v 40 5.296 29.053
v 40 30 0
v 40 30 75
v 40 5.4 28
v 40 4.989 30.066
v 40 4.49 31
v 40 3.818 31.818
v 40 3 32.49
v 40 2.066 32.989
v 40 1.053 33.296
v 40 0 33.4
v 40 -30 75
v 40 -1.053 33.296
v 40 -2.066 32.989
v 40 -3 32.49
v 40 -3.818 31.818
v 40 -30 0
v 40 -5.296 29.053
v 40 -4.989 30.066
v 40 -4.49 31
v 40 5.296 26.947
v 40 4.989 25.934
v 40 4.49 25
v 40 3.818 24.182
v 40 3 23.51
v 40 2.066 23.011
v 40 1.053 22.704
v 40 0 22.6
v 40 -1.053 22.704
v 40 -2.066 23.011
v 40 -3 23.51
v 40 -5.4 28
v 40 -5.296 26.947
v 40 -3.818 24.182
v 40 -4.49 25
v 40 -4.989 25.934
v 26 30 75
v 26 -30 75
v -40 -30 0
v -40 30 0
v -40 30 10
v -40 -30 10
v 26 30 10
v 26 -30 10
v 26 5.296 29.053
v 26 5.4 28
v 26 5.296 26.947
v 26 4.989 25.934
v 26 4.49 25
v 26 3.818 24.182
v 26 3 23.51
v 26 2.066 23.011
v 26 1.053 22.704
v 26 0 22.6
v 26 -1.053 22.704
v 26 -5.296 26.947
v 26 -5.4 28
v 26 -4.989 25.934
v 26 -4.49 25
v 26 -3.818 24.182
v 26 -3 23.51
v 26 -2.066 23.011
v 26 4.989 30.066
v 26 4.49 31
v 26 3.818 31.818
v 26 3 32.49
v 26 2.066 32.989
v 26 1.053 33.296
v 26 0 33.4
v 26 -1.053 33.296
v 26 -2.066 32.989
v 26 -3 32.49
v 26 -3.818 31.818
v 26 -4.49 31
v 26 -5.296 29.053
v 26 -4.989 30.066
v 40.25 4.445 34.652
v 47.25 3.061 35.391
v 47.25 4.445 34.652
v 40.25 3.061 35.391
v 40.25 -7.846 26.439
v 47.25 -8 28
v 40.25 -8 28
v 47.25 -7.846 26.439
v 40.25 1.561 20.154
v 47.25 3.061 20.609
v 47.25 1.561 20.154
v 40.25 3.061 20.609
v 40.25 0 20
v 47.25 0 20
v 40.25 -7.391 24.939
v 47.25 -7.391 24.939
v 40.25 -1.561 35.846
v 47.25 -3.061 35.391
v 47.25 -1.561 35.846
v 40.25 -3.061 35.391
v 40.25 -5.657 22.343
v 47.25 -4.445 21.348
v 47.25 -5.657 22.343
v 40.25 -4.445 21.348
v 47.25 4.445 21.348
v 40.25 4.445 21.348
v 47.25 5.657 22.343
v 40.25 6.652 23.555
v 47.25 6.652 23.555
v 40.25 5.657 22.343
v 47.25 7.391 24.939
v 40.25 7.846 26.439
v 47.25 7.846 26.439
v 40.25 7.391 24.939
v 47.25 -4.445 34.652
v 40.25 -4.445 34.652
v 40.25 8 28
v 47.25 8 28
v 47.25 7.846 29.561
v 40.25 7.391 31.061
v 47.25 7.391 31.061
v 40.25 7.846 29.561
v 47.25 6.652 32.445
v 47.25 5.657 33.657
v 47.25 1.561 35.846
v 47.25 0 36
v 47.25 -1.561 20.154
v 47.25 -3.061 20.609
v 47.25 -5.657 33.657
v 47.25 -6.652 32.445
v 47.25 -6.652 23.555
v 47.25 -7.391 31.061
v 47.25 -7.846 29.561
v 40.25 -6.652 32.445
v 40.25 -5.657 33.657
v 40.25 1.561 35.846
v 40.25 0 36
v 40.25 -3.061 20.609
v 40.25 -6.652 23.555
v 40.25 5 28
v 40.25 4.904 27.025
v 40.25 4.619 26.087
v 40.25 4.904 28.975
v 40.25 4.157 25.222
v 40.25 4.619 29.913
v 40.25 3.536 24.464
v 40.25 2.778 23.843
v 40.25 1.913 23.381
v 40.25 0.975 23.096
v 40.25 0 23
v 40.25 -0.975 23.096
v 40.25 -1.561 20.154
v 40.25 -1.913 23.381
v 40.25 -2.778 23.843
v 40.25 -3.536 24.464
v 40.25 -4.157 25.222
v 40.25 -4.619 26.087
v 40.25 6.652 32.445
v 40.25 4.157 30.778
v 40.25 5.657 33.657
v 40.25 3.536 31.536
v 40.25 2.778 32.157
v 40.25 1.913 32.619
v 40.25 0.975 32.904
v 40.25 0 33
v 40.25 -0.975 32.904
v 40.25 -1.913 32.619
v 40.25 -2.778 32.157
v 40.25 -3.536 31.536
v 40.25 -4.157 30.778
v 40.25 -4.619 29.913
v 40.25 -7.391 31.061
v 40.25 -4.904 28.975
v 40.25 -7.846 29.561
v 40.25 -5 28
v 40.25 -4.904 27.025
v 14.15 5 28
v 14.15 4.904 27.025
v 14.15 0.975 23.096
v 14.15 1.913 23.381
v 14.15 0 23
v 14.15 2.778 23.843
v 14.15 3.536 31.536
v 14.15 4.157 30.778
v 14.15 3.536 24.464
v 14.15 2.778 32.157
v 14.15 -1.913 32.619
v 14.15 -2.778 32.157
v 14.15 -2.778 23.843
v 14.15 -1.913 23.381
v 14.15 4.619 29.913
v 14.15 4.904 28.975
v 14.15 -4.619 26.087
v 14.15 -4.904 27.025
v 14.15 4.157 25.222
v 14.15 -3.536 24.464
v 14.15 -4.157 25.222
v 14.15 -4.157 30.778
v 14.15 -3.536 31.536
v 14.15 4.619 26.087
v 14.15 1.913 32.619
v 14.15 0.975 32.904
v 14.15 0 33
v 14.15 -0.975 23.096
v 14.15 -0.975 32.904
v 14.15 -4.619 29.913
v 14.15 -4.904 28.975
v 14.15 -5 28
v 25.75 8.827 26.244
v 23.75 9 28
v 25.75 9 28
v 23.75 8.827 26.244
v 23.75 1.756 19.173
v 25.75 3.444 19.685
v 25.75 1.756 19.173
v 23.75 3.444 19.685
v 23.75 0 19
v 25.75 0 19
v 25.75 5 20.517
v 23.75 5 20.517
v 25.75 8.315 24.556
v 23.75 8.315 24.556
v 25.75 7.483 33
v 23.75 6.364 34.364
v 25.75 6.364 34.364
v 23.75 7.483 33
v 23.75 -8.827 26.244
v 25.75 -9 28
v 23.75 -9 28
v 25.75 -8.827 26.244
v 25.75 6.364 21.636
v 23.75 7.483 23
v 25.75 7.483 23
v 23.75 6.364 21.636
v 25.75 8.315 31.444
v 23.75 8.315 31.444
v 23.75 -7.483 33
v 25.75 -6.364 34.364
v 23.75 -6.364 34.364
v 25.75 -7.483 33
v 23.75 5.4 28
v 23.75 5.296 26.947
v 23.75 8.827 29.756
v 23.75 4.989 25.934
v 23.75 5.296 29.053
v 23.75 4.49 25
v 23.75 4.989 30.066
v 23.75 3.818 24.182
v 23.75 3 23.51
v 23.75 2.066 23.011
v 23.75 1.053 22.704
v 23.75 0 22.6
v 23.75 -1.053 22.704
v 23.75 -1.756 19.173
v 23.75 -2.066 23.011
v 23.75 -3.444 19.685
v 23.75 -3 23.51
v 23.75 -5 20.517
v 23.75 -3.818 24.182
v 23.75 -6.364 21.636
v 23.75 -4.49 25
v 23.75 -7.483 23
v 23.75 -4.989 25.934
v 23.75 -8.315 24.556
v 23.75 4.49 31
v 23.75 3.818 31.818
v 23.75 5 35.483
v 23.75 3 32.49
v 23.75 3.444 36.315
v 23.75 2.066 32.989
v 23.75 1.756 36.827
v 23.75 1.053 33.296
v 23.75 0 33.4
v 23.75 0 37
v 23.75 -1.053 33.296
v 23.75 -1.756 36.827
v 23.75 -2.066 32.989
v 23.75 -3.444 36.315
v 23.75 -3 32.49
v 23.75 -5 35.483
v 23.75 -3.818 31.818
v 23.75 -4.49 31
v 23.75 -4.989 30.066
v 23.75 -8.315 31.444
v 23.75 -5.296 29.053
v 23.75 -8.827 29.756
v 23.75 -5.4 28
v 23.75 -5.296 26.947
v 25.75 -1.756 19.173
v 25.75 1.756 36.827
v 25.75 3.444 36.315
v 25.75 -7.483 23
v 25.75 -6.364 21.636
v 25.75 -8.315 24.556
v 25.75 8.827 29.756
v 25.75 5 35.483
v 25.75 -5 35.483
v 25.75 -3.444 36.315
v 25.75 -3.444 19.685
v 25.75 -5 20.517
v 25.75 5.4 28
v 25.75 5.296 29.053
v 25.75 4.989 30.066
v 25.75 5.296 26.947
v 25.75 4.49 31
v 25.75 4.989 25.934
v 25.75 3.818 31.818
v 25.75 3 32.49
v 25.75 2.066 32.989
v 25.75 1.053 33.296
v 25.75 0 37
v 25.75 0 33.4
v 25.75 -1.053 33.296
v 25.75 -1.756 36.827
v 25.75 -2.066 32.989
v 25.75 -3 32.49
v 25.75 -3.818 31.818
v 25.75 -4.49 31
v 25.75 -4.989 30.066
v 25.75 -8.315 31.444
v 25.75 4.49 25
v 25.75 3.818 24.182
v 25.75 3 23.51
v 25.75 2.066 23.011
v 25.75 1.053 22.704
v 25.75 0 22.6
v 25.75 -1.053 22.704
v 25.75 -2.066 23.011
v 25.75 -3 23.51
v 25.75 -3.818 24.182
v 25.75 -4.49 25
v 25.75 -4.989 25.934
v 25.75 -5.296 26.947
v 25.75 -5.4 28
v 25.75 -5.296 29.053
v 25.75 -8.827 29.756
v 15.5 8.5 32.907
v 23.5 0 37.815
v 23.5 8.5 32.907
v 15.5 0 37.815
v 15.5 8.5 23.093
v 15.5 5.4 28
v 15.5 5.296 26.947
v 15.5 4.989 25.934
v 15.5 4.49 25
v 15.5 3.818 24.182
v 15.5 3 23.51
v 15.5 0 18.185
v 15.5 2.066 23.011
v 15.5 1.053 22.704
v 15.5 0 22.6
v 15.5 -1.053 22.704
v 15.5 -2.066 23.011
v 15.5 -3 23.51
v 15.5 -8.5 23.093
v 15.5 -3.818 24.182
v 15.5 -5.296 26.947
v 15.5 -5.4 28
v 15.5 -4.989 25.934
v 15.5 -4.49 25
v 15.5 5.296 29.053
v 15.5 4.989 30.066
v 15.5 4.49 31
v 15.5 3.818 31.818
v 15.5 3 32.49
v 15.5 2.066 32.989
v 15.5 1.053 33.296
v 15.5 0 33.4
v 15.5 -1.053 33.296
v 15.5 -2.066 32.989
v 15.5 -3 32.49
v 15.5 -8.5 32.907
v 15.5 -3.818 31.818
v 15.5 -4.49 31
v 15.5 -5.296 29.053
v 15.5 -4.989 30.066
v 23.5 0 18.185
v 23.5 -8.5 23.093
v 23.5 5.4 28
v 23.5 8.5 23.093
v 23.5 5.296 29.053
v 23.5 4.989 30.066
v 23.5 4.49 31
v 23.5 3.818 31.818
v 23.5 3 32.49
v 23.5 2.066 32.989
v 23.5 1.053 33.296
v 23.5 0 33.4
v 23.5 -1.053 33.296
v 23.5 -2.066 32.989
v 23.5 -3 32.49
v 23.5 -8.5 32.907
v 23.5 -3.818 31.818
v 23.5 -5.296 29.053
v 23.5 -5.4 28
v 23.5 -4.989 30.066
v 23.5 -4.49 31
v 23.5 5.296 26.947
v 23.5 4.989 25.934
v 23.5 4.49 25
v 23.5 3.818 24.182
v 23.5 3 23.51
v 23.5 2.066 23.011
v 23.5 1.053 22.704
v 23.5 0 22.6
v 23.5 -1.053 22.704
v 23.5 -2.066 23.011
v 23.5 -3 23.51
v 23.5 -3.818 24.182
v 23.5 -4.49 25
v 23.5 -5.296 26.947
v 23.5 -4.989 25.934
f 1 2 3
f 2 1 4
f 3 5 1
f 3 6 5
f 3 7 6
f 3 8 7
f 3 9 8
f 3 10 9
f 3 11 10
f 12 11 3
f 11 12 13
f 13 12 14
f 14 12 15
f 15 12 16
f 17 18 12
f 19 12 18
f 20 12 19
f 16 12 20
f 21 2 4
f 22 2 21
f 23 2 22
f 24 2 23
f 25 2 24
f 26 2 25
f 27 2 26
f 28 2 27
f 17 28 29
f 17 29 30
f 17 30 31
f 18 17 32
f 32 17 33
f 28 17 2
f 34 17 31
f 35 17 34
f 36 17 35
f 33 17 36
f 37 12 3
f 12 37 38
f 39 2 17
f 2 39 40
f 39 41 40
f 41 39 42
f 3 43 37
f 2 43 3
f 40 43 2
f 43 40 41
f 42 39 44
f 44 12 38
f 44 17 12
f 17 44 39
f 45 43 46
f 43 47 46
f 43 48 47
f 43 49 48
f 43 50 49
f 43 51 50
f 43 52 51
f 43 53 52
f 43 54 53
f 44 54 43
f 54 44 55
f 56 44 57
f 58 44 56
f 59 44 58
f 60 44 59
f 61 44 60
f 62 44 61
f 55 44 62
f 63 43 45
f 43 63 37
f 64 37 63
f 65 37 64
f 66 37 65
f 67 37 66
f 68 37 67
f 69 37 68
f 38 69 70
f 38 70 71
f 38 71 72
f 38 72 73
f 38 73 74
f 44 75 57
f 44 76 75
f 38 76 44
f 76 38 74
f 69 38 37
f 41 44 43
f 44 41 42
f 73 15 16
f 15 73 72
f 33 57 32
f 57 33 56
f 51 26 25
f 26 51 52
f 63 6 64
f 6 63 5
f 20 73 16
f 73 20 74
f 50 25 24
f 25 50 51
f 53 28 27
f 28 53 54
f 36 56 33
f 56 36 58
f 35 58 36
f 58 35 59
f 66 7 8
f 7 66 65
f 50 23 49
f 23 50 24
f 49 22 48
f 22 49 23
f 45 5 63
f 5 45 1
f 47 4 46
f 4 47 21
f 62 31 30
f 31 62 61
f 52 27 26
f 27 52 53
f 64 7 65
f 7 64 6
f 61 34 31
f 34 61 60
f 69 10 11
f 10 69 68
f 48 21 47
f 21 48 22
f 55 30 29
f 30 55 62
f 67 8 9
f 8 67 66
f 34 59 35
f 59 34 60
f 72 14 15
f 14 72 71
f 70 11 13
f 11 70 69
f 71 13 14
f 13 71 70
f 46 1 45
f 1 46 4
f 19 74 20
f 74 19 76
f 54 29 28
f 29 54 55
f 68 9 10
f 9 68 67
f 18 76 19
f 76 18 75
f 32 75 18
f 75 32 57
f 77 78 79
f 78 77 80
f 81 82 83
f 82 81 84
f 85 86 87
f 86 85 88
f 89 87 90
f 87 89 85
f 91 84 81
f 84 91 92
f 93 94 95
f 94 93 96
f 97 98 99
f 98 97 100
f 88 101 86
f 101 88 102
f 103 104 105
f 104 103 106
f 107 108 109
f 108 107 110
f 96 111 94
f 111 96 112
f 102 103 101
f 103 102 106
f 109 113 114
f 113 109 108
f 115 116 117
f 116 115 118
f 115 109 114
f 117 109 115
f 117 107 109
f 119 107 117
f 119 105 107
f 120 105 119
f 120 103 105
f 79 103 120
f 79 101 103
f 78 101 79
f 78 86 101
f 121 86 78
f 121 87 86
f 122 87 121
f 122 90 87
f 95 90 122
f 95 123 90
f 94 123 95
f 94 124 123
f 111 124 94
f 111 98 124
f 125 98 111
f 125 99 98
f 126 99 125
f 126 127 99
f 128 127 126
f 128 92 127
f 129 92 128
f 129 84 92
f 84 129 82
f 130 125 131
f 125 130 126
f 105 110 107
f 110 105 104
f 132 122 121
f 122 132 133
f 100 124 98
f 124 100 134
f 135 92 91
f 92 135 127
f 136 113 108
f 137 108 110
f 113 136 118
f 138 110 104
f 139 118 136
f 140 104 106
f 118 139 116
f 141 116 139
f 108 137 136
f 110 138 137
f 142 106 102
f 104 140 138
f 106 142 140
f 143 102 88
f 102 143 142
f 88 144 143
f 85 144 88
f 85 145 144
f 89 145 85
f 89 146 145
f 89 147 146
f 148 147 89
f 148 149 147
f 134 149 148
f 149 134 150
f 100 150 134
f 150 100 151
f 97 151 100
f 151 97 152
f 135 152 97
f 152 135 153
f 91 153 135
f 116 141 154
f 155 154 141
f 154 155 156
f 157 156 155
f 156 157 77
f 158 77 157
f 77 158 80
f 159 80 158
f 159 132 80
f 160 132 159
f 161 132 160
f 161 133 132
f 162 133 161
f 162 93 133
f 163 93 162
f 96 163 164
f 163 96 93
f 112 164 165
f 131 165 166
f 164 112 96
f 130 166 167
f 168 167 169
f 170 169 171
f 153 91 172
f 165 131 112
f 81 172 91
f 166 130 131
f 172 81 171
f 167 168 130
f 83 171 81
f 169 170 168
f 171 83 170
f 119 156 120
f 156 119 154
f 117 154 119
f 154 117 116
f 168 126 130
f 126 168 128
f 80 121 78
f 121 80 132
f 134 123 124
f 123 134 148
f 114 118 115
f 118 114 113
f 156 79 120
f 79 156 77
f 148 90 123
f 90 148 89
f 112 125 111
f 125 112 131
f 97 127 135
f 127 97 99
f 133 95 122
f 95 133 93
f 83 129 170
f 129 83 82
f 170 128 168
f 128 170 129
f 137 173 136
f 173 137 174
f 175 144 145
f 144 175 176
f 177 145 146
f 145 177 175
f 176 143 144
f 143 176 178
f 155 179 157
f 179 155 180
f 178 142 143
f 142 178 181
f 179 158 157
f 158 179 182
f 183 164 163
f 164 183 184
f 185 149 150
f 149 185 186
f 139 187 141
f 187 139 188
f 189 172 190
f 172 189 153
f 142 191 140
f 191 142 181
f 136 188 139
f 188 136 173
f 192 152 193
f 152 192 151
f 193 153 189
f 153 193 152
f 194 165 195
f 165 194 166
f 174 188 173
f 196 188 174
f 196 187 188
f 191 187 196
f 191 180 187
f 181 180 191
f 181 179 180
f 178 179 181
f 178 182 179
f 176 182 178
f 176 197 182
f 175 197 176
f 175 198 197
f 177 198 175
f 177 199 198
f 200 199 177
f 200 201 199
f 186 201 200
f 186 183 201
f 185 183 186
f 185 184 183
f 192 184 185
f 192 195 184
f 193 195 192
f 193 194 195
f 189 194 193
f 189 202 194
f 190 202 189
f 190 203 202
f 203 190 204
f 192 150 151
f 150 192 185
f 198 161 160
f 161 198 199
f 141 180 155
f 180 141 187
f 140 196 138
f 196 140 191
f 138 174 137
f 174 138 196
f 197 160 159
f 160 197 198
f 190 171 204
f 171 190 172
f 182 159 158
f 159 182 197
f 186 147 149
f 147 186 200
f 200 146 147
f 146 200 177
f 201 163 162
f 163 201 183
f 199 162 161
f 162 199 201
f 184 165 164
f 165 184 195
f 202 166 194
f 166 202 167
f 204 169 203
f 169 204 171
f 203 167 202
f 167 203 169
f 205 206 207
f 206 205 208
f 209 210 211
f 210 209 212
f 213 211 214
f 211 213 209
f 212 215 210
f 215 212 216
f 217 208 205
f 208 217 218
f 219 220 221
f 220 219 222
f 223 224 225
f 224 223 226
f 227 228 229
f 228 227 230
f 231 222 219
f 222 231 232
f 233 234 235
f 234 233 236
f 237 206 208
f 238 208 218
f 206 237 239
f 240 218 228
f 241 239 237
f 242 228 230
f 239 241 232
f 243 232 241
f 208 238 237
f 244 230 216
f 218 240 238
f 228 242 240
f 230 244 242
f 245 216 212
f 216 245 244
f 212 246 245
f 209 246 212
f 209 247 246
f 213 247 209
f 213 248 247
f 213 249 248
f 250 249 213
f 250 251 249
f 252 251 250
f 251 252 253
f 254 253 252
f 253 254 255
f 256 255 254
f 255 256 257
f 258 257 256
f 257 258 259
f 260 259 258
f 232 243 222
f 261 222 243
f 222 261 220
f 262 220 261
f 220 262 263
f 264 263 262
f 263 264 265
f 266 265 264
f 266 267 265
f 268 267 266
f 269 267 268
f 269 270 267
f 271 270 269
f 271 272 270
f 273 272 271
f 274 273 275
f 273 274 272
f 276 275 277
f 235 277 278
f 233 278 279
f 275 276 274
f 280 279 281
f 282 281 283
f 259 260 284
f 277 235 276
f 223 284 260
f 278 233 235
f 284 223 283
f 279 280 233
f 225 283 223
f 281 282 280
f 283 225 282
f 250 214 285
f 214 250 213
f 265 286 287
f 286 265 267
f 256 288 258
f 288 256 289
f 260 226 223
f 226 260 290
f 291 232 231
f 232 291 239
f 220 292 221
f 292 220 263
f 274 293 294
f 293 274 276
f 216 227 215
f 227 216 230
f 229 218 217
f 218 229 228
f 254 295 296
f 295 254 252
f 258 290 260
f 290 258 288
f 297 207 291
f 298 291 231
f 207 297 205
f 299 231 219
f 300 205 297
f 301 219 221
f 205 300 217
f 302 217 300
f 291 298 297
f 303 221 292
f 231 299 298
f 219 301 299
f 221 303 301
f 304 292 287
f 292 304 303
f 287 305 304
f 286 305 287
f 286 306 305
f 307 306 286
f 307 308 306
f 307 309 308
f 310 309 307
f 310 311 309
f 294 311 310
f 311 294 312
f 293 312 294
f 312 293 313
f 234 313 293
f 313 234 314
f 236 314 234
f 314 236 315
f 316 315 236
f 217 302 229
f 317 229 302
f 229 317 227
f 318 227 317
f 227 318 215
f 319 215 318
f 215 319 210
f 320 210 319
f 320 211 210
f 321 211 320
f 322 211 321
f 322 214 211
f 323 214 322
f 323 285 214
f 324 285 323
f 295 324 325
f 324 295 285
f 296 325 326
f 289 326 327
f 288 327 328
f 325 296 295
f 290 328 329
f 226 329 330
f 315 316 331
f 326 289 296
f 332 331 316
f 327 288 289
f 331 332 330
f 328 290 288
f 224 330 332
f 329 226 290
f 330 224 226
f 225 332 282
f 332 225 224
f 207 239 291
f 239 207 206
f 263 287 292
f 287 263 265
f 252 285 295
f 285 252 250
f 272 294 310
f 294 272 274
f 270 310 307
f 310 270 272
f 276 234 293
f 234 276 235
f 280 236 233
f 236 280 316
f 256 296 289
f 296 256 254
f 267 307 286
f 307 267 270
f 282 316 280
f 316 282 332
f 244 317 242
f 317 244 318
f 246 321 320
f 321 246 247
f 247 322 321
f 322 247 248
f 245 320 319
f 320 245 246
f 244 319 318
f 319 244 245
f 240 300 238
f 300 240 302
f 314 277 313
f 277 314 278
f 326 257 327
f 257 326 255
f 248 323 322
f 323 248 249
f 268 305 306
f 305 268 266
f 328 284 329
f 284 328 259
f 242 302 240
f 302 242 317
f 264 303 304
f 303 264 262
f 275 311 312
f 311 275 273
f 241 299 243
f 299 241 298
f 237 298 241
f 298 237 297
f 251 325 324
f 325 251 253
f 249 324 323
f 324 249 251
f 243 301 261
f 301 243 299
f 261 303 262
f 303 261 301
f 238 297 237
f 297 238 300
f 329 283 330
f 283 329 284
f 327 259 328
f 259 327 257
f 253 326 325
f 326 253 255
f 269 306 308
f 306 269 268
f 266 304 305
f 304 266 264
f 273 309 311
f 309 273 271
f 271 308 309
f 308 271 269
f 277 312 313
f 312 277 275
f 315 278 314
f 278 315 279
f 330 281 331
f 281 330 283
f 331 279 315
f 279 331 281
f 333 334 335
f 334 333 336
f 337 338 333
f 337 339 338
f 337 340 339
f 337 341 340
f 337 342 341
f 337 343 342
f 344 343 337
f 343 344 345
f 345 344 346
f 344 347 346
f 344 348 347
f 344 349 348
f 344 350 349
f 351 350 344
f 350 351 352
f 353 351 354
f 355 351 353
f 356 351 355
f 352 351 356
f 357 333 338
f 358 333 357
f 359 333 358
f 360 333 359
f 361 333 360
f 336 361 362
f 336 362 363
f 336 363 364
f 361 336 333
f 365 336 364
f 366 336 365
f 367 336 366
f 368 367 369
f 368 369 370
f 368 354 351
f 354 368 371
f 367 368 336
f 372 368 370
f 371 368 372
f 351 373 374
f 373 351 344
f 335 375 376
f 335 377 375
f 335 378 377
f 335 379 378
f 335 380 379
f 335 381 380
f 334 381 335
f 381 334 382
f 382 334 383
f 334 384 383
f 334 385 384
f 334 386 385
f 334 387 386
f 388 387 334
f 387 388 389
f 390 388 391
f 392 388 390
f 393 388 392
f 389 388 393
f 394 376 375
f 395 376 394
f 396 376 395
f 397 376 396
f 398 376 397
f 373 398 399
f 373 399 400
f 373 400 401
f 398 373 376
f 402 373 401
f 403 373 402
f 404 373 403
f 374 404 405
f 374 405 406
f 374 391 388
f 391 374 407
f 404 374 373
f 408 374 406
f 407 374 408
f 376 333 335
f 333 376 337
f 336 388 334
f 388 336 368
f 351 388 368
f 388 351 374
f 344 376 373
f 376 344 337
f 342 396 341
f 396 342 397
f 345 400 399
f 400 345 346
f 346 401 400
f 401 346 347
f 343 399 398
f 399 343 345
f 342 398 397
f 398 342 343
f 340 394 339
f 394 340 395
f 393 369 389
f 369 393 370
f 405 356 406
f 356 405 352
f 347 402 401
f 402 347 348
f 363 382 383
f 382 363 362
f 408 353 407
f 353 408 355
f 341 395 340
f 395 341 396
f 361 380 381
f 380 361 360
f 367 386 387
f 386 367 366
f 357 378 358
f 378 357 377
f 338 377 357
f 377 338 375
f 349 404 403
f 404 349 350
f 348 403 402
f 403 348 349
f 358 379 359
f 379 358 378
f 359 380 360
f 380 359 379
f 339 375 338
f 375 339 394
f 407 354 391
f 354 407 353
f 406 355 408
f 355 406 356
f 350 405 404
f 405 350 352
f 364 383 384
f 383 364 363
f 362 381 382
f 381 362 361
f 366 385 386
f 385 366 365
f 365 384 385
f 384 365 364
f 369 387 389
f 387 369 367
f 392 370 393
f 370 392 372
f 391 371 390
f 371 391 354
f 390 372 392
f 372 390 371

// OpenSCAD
$fn = 32;

// ------------------------------------------------------------------------
// Bolted bracket: 80 x 60 mm bracket with 1 bolt joints
// Every part is its own module, assembly() places them once.
// ------------------------------------------------------------------------

// --- part 1 ---
module bracket() {
  difference() {
    translate([-40, -30, 0]) cube([80, 60, 75]);
    translate([-41, -31, 10]) cube([67, 62, 66]);
    translate([33, 0, 28]) rotate([0, 90, 0]) cylinder(h = 16, d = 10.8, center = true);
  }
}

// --- part 2 ---
module bolt() {
  cylinder(h = 7, d = 16);
  translate([0, 0, -26.1]) cylinder(h = 26.1, d = 10);
}

// --- part 3 ---
module washer() {
  difference() {
      translate([0, 0, 0]) cylinder(h = 2, d = 18);
      translate([0, 0, -1]) cylinder(h = 4, d = 10.8);
    }
}

// --- part 4 ---
module nut() {
  difference() {
    linear_extrude(height = 8) polygon(points = [[9.815, 0], [4.907, 8.5], [-4.907, 8.5], [-9.815, 0], [-4.907, -8.5], [4.907, -8.5]]);
    translate([0, 0, -1]) cylinder(h = 10, d = 10.8);
  }
}

// --- assembly ---
module assembly() {
  translate([0, 0, 0]) rotate([0, 0, 0]) bracket();
  translate([40.25, 0, 28]) rotate([0, 90, 0]) bolt();
  translate([23.75, 0, 28]) rotate([0, 90, 0]) washer();
  translate([15.5, 0, 28]) rotate([0, 90, 0]) nut();
}

assembly();
